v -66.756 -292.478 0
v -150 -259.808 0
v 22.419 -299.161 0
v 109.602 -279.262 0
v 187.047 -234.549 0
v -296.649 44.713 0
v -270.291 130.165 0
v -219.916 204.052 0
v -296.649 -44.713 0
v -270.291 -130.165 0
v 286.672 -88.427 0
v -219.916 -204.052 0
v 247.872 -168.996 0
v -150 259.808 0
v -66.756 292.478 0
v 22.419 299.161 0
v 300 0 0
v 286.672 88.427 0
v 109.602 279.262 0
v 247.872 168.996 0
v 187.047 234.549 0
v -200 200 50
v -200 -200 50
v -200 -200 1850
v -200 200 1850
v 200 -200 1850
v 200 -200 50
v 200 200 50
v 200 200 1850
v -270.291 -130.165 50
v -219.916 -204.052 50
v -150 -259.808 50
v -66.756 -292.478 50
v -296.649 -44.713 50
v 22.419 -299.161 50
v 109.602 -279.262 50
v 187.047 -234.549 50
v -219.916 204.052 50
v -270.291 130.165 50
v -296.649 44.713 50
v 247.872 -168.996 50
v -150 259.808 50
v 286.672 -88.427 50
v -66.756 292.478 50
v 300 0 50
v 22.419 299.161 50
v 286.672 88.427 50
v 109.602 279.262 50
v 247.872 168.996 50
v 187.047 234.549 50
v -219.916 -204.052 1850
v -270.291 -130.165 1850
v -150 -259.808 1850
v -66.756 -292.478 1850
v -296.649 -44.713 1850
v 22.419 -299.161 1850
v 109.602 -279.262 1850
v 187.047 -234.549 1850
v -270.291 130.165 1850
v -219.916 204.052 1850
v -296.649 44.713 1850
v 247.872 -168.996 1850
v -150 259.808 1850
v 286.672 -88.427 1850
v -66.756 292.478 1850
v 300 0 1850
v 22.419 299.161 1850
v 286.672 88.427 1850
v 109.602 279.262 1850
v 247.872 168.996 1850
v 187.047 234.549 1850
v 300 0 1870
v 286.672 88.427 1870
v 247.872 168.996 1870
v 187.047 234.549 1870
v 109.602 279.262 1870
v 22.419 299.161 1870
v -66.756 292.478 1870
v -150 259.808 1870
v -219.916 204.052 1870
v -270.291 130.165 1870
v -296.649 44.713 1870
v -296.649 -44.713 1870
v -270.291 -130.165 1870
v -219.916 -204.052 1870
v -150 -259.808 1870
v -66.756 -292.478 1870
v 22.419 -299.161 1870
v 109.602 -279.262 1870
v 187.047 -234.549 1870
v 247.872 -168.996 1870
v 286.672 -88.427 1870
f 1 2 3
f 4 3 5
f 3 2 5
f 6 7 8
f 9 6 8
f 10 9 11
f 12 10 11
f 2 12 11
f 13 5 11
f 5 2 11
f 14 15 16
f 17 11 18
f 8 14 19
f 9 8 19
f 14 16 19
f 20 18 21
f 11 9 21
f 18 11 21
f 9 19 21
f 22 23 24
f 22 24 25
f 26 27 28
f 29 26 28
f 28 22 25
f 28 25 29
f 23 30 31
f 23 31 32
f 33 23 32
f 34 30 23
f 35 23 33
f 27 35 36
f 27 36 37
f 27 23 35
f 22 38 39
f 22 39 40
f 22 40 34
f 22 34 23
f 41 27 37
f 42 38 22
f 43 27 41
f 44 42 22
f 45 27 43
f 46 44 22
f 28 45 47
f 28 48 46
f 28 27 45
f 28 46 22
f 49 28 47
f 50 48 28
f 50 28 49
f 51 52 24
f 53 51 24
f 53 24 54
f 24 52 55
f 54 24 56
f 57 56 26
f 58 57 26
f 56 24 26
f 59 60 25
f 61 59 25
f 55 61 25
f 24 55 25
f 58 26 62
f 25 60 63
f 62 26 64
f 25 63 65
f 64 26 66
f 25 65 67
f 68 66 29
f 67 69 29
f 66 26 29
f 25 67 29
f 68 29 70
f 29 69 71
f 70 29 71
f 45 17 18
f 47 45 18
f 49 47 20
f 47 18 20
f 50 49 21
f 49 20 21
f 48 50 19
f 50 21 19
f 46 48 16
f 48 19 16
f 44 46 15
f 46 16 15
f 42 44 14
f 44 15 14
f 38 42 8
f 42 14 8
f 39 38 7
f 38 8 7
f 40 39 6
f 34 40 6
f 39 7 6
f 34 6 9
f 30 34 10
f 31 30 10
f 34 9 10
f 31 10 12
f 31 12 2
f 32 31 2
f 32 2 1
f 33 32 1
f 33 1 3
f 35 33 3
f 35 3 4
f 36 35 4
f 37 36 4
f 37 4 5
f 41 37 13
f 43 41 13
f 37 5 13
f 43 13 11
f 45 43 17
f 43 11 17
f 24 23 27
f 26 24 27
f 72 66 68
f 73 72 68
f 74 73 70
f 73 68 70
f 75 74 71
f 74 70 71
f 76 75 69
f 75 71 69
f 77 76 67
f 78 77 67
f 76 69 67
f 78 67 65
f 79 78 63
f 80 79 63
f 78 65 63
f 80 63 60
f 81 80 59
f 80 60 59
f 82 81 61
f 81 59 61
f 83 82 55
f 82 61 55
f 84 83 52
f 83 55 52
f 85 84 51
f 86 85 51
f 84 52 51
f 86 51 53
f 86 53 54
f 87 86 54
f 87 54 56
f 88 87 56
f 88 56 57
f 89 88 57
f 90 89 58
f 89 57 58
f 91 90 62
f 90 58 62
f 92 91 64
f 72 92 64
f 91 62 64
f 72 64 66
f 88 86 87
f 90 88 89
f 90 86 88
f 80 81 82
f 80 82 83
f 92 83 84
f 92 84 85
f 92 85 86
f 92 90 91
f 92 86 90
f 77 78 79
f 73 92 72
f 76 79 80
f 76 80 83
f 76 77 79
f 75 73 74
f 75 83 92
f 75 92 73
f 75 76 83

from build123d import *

# Parameters (mm, degrees)
F1_START = 1850
F0_R     = 300
F0_W     = 400
F0_H     = 400
F1_DEPTH = 20
F2_DEPTH = 1850
F3_DEPTH = 50


with BuildPart() as f1:
    # F0 (on Top) → F1 (new body)
    with BuildSketch(Plane.XY.offset(F1_START)):
        Circle(F0_R)
        Rectangle(F0_W, F0_H, mode=Mode.SUBTRACT)
        Rectangle(F0_W, F0_H)
    extrude(amount=F1_DEPTH)

    # F0 (on Top) → F2 (join)
    with BuildSketch(Plane.XY):
        Rectangle(F0_W, F0_H)
    extrude(amount=F2_DEPTH)

    # F0 (on Top) → F3 (join)
    with BuildSketch(Plane.XY):
        Circle(F0_R)
        Rectangle(F0_W, F0_H, mode=Mode.SUBTRACT)
    extrude(amount=F3_DEPTH)


solid = f1.part
